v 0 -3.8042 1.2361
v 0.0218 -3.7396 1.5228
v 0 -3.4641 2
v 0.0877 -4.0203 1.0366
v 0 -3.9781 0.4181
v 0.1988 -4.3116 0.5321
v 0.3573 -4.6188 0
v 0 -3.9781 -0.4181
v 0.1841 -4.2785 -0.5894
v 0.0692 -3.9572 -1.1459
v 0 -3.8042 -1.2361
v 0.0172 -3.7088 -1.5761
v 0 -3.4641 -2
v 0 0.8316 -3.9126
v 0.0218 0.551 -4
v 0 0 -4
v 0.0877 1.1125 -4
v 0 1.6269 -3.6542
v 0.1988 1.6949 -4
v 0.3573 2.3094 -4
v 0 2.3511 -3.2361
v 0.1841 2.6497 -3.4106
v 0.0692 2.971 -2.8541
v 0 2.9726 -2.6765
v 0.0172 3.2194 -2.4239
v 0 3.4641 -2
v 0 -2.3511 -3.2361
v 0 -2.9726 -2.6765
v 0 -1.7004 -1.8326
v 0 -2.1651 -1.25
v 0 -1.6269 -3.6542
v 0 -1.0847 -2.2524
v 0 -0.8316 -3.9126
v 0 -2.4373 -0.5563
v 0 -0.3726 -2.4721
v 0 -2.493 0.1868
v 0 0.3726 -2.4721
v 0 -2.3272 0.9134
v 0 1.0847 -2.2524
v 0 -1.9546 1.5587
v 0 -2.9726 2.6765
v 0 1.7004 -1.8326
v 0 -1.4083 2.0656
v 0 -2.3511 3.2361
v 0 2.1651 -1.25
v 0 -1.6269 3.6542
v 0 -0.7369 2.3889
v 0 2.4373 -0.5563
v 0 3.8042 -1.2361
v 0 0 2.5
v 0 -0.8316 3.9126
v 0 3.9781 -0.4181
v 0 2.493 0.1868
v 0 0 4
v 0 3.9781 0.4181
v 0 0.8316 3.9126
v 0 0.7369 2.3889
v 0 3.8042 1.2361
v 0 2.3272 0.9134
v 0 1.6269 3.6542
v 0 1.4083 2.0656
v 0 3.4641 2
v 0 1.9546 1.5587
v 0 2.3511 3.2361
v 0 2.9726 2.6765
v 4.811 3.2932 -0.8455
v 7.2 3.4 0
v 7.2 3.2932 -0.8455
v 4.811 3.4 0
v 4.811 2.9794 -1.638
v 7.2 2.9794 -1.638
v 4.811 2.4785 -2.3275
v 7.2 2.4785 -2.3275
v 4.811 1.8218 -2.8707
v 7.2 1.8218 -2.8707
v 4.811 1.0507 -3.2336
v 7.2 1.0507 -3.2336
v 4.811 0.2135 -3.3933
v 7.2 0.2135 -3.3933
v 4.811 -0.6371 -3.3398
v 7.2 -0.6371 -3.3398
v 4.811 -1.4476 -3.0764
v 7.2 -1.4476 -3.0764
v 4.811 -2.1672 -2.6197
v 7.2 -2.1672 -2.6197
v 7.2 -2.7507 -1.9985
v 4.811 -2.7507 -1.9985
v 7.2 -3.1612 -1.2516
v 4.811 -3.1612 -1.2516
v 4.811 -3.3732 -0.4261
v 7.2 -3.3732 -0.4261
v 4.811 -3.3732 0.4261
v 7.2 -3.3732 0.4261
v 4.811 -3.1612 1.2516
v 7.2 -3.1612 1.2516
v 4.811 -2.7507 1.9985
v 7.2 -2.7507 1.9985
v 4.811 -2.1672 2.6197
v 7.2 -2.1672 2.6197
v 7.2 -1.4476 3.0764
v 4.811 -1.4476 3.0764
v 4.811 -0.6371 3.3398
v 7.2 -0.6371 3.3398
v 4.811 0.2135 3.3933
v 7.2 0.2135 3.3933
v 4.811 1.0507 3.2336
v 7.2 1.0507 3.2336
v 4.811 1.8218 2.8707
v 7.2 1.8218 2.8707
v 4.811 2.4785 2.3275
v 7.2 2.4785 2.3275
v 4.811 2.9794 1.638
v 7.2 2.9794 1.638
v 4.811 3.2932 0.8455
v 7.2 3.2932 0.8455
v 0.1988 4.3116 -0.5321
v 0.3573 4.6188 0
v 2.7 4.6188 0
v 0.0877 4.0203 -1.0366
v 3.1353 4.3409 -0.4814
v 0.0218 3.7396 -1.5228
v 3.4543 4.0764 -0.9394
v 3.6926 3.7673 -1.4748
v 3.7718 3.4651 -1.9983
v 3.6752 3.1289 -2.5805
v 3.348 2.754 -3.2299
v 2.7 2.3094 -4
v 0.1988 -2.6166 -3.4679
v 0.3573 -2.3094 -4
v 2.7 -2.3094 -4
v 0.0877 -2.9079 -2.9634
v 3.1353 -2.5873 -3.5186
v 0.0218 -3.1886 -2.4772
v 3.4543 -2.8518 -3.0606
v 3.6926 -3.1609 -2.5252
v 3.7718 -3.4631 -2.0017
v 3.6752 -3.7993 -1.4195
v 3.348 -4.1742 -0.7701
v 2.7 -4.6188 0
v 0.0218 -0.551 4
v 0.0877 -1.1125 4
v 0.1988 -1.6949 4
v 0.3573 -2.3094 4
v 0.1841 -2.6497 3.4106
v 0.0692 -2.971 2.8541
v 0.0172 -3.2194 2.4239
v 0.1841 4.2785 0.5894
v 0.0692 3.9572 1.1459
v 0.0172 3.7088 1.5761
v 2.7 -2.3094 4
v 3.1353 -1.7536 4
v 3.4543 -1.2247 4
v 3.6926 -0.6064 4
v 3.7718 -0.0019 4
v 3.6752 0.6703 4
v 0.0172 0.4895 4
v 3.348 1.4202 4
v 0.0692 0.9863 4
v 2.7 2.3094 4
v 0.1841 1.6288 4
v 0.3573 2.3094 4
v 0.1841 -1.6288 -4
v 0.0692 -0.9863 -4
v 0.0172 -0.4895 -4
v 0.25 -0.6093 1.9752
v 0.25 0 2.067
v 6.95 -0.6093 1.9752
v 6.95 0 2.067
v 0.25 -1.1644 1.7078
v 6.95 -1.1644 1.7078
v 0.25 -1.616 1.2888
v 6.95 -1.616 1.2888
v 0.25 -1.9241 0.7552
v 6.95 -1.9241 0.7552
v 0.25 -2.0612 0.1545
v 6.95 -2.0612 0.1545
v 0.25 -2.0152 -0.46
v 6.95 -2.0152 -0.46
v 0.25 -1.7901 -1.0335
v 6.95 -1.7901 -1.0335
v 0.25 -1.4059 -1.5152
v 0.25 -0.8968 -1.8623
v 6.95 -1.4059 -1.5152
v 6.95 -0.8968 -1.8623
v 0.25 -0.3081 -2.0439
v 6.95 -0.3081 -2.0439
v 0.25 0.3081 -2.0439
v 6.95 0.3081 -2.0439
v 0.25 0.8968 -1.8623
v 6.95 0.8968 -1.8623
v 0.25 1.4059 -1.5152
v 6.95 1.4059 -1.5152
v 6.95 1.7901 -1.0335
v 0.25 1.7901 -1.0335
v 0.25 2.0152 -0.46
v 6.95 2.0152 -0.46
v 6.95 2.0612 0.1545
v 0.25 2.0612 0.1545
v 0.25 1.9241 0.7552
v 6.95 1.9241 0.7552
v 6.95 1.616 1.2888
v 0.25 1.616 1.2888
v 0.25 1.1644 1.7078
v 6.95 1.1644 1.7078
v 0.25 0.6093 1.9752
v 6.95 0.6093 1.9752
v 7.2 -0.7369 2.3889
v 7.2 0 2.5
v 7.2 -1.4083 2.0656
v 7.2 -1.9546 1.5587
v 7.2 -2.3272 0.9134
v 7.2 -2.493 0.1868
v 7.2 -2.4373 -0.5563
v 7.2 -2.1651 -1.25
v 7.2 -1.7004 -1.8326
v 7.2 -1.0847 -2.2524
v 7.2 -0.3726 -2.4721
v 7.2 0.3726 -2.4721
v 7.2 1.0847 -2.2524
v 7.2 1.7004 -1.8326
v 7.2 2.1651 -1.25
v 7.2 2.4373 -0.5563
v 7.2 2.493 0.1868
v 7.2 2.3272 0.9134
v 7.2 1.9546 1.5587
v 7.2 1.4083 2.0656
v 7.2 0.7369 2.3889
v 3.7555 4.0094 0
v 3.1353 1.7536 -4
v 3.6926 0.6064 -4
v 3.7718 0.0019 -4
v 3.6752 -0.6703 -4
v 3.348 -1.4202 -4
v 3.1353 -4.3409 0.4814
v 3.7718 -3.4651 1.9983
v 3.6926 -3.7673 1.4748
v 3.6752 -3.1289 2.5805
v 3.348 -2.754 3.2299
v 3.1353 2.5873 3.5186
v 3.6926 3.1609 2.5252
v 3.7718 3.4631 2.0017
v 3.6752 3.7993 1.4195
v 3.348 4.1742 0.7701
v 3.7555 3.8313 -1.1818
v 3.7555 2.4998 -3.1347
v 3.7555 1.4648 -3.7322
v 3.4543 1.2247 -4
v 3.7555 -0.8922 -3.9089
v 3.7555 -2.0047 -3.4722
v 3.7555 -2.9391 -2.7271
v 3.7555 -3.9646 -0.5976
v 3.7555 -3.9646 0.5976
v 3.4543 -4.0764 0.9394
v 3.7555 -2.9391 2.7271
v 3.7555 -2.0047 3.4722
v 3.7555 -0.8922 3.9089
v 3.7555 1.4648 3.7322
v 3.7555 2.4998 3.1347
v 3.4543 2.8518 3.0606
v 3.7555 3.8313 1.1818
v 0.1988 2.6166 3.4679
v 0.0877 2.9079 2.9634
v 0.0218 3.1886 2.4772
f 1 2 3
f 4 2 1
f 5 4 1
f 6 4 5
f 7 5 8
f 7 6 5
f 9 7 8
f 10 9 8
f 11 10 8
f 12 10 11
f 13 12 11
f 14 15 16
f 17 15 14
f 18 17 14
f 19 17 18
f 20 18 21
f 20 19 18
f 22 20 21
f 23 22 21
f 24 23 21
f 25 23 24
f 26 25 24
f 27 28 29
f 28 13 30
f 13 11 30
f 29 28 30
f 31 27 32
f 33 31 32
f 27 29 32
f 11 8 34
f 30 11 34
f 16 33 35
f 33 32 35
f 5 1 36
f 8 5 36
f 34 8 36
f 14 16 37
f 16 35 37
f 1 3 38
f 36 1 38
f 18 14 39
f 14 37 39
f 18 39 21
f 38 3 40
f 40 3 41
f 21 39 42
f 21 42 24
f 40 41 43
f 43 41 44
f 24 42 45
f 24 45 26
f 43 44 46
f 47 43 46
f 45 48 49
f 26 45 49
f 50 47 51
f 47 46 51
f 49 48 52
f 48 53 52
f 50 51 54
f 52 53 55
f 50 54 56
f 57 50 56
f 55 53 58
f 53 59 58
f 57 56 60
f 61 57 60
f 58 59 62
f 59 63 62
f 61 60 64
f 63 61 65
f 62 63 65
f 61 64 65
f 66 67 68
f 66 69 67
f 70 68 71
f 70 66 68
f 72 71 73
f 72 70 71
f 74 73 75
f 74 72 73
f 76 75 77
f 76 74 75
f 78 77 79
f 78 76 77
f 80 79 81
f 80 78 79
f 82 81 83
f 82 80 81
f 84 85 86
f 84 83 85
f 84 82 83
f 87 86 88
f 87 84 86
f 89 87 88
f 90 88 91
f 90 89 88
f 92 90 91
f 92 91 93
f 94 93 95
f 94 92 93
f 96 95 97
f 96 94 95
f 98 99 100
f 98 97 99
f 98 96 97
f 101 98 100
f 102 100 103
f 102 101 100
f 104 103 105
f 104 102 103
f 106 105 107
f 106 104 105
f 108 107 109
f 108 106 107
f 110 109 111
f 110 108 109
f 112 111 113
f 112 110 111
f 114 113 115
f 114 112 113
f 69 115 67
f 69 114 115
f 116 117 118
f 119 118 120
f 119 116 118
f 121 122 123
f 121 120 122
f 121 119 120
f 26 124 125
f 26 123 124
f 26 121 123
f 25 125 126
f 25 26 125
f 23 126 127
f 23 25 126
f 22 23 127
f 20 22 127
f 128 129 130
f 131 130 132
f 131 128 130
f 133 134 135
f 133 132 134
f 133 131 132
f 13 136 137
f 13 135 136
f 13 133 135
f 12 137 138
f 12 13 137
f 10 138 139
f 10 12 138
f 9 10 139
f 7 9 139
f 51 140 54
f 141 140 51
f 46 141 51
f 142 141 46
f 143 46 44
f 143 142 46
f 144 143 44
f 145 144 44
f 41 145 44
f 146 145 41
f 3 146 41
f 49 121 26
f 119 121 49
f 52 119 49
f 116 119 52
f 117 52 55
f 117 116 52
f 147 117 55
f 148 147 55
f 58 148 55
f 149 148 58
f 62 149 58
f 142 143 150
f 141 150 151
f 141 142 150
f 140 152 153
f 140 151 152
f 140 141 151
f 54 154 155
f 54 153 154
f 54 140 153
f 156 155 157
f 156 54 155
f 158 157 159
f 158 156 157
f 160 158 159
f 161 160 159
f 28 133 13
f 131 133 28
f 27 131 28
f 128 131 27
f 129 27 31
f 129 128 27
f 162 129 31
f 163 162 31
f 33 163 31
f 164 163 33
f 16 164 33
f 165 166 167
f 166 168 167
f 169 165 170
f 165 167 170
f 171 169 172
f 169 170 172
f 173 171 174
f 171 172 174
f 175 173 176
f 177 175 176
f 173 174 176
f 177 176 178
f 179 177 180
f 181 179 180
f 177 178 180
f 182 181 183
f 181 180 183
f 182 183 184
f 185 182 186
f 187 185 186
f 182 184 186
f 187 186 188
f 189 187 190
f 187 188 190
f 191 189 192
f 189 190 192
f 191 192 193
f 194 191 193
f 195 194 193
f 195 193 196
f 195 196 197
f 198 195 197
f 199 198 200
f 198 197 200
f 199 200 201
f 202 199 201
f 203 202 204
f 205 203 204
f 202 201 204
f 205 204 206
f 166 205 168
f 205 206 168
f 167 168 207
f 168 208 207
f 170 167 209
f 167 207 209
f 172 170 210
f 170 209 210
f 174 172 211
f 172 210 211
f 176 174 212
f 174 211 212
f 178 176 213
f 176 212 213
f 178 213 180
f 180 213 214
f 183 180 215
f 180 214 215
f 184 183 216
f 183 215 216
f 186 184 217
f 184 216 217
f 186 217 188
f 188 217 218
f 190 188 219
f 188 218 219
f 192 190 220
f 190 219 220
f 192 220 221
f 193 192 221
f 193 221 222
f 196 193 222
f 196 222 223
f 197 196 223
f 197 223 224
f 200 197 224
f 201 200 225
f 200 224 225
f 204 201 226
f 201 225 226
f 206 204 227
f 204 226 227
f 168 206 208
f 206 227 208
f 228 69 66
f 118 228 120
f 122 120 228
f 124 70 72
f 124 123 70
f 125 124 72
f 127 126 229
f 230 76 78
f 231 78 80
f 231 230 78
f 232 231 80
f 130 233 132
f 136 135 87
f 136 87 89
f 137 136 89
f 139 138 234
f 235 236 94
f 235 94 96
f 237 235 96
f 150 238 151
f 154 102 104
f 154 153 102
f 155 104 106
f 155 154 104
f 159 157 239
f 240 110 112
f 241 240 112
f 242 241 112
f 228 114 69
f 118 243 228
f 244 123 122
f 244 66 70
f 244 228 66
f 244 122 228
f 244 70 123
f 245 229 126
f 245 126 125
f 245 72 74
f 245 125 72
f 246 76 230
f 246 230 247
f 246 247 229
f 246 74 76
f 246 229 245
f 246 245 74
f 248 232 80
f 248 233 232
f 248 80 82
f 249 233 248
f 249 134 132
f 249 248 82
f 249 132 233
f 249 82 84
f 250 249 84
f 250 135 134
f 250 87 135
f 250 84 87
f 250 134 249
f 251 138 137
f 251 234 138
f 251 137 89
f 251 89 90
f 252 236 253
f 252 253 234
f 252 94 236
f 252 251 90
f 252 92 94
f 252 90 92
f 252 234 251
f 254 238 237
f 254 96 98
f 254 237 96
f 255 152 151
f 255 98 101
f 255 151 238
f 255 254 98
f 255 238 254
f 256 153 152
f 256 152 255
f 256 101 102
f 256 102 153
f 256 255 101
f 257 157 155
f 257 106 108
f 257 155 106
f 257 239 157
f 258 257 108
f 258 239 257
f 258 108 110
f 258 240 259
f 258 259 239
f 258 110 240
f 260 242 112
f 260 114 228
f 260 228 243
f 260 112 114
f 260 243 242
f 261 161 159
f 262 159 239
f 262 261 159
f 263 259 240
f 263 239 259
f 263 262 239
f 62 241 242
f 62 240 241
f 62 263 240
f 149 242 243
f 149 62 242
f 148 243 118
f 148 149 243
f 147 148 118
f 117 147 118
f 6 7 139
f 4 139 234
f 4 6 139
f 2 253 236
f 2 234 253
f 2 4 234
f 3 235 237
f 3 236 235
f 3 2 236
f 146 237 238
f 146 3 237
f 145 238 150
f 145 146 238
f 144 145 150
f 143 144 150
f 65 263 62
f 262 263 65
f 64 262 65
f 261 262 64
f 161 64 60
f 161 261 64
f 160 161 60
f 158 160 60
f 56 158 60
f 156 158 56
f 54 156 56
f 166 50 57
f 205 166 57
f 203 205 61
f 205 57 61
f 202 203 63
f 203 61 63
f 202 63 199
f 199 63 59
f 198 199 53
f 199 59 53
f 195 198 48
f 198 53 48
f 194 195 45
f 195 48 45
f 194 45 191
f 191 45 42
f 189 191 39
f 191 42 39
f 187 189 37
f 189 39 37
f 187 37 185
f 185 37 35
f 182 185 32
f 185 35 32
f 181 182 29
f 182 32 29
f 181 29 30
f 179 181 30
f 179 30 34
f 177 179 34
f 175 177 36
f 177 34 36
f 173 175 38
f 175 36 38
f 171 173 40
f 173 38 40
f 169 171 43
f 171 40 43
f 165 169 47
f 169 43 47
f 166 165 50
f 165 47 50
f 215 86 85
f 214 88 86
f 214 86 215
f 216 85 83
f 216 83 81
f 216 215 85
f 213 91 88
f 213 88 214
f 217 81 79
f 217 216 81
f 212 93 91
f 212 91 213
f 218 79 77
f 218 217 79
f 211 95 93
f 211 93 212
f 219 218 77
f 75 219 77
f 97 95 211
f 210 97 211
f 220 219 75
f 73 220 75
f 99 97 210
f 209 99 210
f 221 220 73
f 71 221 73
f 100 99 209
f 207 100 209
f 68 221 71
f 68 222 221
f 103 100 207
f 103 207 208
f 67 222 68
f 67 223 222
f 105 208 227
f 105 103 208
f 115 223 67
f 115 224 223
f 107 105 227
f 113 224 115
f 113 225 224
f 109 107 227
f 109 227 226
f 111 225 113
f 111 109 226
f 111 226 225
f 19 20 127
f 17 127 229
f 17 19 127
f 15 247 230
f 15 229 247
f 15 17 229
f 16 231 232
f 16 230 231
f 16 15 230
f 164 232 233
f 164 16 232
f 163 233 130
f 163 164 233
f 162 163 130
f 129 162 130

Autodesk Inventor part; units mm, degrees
ref_plane "YZ Plane" through (0, 0, 0) normal (1, 0, 0) x (0, 1, 0)
ref_plane "XZ Plane" through (0, 0, 0) normal (0, 1, 0) x (-1, 0, 0)
sketch "Sketch1" plane through (0, 0, 0) normal (1, 0, 0) x (0, 1, 0)
  line L0 (-4.6188, 0) -> (-2.3094, 4)
  line L1 (-2.3094, 4) -> (2.3094, 4)
  line L2 (2.3094, 4) -> (4.6188, 0)
  line L3 (4.6188, 0) -> (2.3094, -4)
  line L4 (2.3094, -4) -> (-2.3094, -4)
  line L5 (-2.3094, -4) -> (-4.6188, 0)
  point P0 (0, 0)
  point P1 (0, 0)
  dimension "d0" = 9.2376
extrude "Body" add sketch "Sketch1" along normal blind 7.2
sketch "Sketch2" plane through (0, 0, 0) normal (-1, 0, 0) x (0, 0, 1)
  line L0 (0, -6.4663) -> (0, 6.4663) projected
  line L1 (-5.6, 0) -> (5.6, 0) projected
  point P0 (0, 0)
hole "Thread" at (0, 0, 0) direction (1, 0, 0) diameter 4.134 end through all thread size "M5x0.8" class "6H" standard "ANSI Metric M Profile"
chamfer "Chamfer1" distance 0.433 angle 30 1 edges at (0, 0, -2.067) measured on face at (0, -2.8764, -1.7247)
chamfer "Chamfer2" distance 0.433 angle 30 1 edges at (7.2, 0, -2.067) measured on face at (7.2, -2.8764, -1.7247)
sketch "Sketch3" plane through (0, 0, 0) normal (0, 0, 1) x (1, 0, 0)
  line L0 (0, 2.3094) -> (0, 4.6188) projected
  line L1 (0, 4.6188) -> (7.2, 4.6188) projected
  line L2 (7.2, 2.3094) -> (7.2, 4.6188) projected
  line L3 (-1.44, 0) -> (8.64, 0) projected
  line L4 (0.3573, 4.6188) -> (0, 4)
  line L5 (7.2, 3.4) -> (4.811, 3.4)
  line L6 (4.811, 3.4) -> (2.7, 4.6188)
  dimension "d3" = 30
  dimension "d5" = 8
  dimension "d6" = 6.8
  dimension "d8" = 60
  dimension "d9" = 2.7
revolve "Chamfer3" cut sketch "Sketch3" angle 360 about axis through (-10, 0, 0) along (1, 0, 0)
ref_plane "Work Plane1" through (14.1836, 0, 0) normal (0, 0, 1) x (-1, 0, 0)
equation "\"d0\" = 1.1547 * SW"
equation "\"d1\" = KOH"
equation "\"d3\" = ANG1"
equation "\"d5\" = SW0"
equation "\"d6\" = SW1"
equation "\"d8\" = ANG2"
equation "\"d9\" = KOH1"
equation "\"d10\" = -0.5 * GD1 + 0.5 * NND"
equation "\"d39\" = -0.5 * GD1 + 0.5 * NND"
equation "\"d12\" = -0.5 * GD1 + 0.5 * NND"
equation "\"d40\" = -0.5 * GD1 + 0.5 * NND"
equation "\"ANG1\" = 30deg"
equation "\"ANG2\" = 60deg"
equation "\"NND\" = 5"
equation "\"KOH\" = 7.2"
equation "\"SW\" = 8"
equation "\"SW0\" = SW"
equation "\"SW1\" = 0.85 * SW"
equation "\"KOH1\" = 2.7"
equation "\"GUL\" = 0.541266 * PTC"
equation "\"THREADDIA\" = 5"
equation "\"TOA\" = 30deg"
equation "\"PTC\" = 0.8"
equation "\"E0\" = 1.155 * SW"
equation "\"GAL\" = 0.541266 * PTC"
equation "\"GD1\" = 4.133975"
properties part number "ANSI B18.16.3M - Property Class 9 - Metric M5 x 0.8 Top Insert Type" material "Steel, Mild"
